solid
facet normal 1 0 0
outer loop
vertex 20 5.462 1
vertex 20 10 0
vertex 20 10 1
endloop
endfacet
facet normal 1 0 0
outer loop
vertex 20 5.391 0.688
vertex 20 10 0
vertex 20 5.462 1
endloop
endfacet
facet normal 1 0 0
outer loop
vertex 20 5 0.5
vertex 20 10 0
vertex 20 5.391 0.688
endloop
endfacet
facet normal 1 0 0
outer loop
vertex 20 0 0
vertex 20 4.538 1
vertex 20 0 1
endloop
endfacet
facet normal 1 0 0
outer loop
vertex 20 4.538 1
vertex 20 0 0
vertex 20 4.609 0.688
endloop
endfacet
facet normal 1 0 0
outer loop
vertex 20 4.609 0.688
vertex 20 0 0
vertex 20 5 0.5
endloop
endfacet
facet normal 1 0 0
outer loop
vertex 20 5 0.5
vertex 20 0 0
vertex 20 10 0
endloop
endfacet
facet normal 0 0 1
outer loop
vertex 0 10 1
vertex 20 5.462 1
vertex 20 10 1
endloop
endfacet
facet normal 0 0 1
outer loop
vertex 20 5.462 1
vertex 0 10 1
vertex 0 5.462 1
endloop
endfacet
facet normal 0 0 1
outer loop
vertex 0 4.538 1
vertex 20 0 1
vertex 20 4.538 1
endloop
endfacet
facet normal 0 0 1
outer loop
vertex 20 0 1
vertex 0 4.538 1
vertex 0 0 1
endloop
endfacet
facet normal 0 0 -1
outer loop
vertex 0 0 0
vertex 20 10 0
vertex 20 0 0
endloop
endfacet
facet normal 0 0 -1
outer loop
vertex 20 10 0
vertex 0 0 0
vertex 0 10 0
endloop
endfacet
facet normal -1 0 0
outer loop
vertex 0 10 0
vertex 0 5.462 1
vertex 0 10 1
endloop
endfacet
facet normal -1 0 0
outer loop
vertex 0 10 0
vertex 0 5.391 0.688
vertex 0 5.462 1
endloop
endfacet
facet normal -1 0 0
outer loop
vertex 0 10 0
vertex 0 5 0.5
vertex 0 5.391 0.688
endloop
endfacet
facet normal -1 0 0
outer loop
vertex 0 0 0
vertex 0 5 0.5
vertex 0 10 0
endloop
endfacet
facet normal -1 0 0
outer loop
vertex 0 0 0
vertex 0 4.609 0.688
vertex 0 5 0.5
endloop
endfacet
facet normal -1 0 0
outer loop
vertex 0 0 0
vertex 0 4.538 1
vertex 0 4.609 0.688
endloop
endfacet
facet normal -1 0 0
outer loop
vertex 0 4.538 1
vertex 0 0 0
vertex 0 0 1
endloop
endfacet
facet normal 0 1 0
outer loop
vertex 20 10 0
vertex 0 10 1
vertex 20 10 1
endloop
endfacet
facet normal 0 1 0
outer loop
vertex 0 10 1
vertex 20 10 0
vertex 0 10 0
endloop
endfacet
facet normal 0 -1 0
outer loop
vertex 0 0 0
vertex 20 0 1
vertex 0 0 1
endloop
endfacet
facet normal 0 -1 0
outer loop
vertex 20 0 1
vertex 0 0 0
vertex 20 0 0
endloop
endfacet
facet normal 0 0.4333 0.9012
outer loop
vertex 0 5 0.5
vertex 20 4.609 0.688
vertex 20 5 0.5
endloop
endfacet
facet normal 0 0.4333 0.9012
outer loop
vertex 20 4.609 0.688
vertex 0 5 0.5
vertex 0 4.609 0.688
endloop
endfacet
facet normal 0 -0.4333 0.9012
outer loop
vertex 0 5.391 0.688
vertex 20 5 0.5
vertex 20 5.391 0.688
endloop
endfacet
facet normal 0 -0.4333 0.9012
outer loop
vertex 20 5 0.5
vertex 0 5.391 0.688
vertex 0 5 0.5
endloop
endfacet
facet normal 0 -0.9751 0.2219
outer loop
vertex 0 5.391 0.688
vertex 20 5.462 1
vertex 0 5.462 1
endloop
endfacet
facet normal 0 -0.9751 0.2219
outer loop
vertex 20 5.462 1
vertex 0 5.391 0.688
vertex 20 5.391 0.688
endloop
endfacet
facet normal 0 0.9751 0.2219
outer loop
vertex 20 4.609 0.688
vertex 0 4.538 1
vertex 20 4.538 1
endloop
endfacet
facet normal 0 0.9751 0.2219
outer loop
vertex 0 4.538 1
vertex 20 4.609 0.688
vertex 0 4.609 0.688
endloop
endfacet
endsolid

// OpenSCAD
$fa=4;
$fs=0.5;

tolerance = 0.15;


difference(){
    cube([20,10,1]);
    translate([0,5,1]) rotate([0,90,0]) cylinder(r = 0.5, h=50);
}
//translate([0,0,30]) rotate([0,180,0]) effector();
//translate([2,0,0]) mold();

module effector() {
    difference() {
        union() {
            cube([5,10,30]);
            translate([0,0,28]) cube([45,10,2]);
        }
        translate([2.5,2.5,0]) cylinder(r1 = 1.2, r2 = 1.8, h=2);
        translate([2.5,7.5,0]) cylinder(r1 = 1.2, r2 = 1.8, h=2);
        translate([0,5,0]) cylinder(r = 0.5, h=50);
    }
}

module mold() {
    difference() {
        cube([7,12,10]);
        translate([1-tolerance,1-tolerance,0.6]) cube([5+2*tolerance,10+2*tolerance,10]);
    }
}
